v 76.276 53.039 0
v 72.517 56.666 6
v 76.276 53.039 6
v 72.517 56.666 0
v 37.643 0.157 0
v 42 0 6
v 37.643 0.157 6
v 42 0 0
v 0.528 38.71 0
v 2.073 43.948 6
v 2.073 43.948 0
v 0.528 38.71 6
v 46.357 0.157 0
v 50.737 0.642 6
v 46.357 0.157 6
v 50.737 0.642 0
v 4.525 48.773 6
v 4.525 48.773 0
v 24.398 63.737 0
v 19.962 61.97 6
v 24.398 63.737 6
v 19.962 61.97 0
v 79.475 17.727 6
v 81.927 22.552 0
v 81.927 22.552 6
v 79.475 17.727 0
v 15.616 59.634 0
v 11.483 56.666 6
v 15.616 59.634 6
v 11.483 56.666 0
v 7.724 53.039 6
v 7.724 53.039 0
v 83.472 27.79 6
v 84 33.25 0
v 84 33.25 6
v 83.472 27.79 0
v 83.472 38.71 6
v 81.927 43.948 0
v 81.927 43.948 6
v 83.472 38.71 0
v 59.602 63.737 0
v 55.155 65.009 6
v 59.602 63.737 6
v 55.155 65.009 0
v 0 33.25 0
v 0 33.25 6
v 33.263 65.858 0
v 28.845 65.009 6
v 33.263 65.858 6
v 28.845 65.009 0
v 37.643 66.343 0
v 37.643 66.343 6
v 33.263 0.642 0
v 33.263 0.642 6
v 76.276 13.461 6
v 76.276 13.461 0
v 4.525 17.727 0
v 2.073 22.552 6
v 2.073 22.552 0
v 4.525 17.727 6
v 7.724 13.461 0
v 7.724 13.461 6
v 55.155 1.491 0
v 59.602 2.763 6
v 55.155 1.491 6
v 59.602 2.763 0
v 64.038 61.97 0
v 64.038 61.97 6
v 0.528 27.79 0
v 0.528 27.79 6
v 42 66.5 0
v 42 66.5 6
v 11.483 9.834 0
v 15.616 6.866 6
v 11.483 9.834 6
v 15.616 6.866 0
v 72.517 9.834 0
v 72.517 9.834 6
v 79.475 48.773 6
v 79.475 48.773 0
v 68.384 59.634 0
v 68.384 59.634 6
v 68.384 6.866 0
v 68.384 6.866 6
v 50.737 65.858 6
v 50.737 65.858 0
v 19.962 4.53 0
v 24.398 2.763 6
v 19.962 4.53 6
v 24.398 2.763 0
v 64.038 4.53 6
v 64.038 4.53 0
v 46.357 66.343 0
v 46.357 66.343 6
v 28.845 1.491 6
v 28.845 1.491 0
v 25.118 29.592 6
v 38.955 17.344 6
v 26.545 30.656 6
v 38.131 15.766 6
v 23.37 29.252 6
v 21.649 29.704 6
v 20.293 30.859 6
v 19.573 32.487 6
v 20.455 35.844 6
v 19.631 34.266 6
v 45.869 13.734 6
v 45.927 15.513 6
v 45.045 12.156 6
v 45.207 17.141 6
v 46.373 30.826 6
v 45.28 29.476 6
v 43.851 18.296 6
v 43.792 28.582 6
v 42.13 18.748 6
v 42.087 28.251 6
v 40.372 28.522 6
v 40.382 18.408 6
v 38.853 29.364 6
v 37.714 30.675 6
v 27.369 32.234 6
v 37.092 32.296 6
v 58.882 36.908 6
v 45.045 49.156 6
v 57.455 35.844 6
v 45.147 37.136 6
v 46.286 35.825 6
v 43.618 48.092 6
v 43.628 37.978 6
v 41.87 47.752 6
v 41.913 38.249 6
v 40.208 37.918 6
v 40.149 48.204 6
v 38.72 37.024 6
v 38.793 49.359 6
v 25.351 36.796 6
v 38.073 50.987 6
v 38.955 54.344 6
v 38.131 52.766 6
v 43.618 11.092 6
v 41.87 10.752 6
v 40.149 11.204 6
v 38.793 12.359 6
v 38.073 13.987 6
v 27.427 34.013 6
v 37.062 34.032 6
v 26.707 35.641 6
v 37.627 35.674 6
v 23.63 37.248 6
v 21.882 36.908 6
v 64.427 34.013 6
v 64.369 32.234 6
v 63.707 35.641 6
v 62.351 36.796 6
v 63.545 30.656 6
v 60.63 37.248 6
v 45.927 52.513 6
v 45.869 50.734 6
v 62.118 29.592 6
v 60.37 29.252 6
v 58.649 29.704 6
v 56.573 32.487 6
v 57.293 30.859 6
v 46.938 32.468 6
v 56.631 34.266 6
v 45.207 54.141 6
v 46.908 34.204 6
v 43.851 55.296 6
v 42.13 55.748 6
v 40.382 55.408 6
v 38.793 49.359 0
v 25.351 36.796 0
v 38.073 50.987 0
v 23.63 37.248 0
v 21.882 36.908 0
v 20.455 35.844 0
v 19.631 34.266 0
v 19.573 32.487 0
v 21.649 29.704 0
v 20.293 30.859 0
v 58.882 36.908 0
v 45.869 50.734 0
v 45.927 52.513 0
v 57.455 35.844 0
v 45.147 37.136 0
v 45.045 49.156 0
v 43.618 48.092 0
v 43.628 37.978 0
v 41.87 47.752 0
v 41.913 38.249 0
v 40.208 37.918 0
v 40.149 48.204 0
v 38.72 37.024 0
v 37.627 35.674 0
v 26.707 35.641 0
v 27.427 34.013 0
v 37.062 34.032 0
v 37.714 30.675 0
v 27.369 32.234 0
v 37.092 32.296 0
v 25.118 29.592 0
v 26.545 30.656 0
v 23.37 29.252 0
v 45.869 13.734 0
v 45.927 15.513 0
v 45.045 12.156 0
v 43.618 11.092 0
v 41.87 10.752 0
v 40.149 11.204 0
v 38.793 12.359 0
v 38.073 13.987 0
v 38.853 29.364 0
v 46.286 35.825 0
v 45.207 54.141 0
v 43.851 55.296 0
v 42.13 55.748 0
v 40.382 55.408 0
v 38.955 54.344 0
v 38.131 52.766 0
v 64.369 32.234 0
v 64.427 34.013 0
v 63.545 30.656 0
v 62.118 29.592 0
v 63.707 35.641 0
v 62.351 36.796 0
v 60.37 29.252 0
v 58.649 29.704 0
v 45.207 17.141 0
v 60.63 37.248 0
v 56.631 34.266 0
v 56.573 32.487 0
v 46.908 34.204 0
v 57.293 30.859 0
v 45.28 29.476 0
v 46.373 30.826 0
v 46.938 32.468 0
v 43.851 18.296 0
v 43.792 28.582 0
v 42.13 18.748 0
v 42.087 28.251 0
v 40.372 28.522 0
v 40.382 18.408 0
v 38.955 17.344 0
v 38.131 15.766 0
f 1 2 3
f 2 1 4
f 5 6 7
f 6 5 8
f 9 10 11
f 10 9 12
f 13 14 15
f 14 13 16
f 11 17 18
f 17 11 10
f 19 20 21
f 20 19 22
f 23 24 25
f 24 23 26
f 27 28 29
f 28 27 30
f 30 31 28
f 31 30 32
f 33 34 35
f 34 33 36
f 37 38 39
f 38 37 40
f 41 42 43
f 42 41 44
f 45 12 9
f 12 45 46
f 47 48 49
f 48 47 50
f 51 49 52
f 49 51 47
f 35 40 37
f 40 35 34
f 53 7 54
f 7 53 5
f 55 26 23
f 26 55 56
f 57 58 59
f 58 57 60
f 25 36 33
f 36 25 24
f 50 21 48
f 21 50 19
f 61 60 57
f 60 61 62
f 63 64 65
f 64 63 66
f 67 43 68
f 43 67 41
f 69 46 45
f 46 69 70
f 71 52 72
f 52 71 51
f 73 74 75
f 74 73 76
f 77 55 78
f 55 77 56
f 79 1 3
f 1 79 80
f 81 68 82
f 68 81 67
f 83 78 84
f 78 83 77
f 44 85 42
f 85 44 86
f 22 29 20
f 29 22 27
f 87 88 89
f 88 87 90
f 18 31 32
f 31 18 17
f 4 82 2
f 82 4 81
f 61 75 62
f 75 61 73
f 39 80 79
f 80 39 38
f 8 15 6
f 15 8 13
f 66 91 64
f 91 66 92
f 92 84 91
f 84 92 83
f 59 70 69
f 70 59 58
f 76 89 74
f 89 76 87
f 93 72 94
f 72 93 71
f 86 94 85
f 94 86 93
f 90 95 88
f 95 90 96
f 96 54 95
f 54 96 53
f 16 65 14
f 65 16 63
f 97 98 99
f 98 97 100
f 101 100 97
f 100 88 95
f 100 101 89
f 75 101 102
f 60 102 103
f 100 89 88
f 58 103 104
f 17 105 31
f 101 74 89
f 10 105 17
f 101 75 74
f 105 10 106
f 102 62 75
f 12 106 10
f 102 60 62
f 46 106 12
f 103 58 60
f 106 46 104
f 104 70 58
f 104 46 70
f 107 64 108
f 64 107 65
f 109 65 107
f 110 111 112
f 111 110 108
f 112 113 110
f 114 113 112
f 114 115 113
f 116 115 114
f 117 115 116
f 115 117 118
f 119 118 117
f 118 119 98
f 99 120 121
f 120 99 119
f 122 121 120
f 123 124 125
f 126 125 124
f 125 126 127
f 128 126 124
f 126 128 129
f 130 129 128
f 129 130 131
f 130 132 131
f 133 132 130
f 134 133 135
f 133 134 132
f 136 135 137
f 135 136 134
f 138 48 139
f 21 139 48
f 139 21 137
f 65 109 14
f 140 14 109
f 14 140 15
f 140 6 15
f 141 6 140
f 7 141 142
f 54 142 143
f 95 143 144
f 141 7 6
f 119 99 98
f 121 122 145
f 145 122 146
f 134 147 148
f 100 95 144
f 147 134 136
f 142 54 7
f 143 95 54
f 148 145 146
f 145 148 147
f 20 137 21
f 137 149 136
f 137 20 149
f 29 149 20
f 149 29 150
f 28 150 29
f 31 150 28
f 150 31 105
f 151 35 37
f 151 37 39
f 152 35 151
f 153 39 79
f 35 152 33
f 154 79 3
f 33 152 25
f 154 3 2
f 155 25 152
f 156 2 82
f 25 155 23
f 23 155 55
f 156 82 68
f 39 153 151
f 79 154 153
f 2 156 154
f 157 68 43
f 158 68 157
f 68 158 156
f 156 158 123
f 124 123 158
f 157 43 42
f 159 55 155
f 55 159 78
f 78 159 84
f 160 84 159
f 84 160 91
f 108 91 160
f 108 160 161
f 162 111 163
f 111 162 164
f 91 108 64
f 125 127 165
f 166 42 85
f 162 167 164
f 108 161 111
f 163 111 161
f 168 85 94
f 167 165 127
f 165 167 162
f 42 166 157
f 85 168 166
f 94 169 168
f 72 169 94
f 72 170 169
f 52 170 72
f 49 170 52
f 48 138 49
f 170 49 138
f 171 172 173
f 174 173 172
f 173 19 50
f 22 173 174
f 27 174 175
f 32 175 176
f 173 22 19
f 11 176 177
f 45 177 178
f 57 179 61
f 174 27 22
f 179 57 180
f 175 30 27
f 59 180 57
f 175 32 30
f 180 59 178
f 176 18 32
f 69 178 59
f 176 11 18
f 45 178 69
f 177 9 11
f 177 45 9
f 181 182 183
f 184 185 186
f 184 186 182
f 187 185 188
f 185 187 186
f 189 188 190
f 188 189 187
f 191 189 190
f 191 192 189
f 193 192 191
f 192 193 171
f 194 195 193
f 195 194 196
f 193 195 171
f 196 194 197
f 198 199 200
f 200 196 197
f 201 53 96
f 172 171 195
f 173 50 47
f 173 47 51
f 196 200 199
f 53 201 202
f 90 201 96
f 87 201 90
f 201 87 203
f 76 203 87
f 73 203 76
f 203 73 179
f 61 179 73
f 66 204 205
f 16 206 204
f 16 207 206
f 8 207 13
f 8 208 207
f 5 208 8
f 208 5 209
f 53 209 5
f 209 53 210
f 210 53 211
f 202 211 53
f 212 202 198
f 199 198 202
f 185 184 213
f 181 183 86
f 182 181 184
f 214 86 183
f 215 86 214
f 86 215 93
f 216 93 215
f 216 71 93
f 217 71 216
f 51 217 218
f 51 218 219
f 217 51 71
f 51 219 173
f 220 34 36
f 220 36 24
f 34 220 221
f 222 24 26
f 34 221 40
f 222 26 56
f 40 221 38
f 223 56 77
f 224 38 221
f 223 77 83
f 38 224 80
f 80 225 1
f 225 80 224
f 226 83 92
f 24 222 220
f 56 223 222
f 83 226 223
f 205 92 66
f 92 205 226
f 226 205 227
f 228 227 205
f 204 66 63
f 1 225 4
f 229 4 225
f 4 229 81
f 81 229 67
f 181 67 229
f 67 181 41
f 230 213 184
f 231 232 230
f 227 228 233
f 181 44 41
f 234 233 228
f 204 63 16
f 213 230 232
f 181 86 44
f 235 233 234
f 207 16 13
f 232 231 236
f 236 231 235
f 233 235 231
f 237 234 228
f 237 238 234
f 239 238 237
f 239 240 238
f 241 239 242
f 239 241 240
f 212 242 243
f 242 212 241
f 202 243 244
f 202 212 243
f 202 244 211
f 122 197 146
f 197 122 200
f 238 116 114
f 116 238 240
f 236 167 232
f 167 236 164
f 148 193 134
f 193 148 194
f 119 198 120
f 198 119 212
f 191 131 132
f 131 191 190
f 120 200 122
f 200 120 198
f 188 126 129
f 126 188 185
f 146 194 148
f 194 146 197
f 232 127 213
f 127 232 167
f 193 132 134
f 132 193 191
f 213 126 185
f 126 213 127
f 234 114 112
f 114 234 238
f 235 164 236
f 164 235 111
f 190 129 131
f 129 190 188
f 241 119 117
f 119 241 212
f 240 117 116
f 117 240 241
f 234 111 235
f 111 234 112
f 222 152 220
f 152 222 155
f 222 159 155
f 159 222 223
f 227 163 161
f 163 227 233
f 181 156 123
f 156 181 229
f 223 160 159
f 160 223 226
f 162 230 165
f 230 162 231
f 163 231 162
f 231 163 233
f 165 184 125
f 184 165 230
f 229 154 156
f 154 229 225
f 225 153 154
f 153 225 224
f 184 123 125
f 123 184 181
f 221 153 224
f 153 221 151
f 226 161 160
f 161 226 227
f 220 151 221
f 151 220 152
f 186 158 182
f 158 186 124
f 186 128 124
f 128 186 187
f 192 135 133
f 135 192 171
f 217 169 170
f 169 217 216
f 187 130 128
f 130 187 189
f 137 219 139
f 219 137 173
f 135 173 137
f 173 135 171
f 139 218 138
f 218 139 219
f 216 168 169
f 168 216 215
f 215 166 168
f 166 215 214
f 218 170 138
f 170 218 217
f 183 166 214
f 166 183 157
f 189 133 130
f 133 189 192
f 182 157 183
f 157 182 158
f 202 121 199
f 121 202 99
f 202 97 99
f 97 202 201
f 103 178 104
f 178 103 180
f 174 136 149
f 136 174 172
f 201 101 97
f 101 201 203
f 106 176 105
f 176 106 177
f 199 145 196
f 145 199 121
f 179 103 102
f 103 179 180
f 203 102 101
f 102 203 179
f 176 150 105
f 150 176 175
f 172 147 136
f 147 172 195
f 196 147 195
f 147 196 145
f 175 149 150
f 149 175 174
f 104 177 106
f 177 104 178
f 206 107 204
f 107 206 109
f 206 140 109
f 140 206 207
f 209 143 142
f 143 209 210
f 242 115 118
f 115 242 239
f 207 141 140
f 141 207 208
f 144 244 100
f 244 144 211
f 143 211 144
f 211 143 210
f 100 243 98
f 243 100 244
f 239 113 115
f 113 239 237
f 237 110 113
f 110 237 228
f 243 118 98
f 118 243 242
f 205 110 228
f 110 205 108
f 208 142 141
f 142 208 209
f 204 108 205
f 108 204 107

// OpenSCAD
$fn = 32;

// ----------------------------------------------------------------------
// Cam plate: double_lobe cam, base R32
// ----------------------------------------------------------------------

// --- parameters (mm) ---
base_r = 32;              // base circle radius
lobe_h = 10;              // cam lobe rise
bore_r = 5;               // shaft bore radius
plate_t = 6;              // plate thickness, Z (extrusion height)
ring_r = 18.5;            // lightening ring radius
bolt_r = 4;               // lightening hole radius

profile = [[84, 33.25], [83.472, 38.71], [81.927, 43.948], [79.475, 48.773], [76.276, 53.039], [72.517, 56.666], [68.384, 59.634], [64.038, 61.97], [59.602, 63.737], [55.155, 65.009], [50.737, 65.858], [46.357, 66.343], [42, 66.5], [37.643, 66.343], [33.263, 65.858], [28.845, 65.009], [24.398, 63.737], [19.962, 61.97], [15.616, 59.634], [11.483, 56.666], [7.724, 53.039], [4.525, 48.773], [2.073, 43.948], [0.528, 38.71], [0, 33.25], [0.528, 27.79], [2.073, 22.552], [4.525, 17.727], [7.724, 13.461], [11.483, 9.834], [15.616, 6.866], [19.962, 4.53], [24.398, 2.763], [28.845, 1.491], [33.263, 0.642], [37.643, 0.157], [42, 0], [46.357, 0.157], [50.737, 0.642], [55.155, 1.491], [59.602, 2.763], [64.038, 4.53], [68.384, 6.866], [72.517, 9.834], [76.276, 13.461], [79.475, 17.727], [81.927, 22.552], [83.472, 27.79]];  // primary outline, 48 points, counter clockwise
void_1 = [[46.908, 34.204], [46.286, 35.825], [45.147, 37.136], [43.628, 37.978], [41.913, 38.249], [40.208, 37.918], [38.72, 37.024], [37.627, 35.674], [37.062, 34.032], [37.092, 32.296], [37.714, 30.675], [38.853, 29.364], [40.372, 28.522], [42.087, 28.251], [43.792, 28.582], [45.28, 29.476], [46.373, 30.826], [46.938, 32.468]];  // shaft bore, 18 points
void_2 = [[64.427, 34.013], [63.707, 35.641], [62.351, 36.796], [60.63, 37.248], [58.882, 36.908], [57.455, 35.844], [56.631, 34.266], [56.573, 32.487], [57.293, 30.859], [58.649, 29.704], [60.37, 29.252], [62.118, 29.592], [63.545, 30.656], [64.369, 32.234]];  // lightening hole 1, 14 points
void_3 = [[45.927, 52.513], [45.207, 54.141], [43.851, 55.296], [42.13, 55.748], [40.382, 55.408], [38.955, 54.344], [38.131, 52.766], [38.073, 50.987], [38.793, 49.359], [40.149, 48.204], [41.87, 47.752], [43.618, 48.092], [45.045, 49.156], [45.869, 50.734]];  // lightening hole 2, 14 points
void_4 = [[27.427, 34.013], [26.707, 35.641], [25.351, 36.796], [23.63, 37.248], [21.882, 36.908], [20.455, 35.844], [19.631, 34.266], [19.573, 32.487], [20.293, 30.859], [21.649, 29.704], [23.37, 29.252], [25.118, 29.592], [26.545, 30.656], [27.369, 32.234]];  // lightening hole 3, 14 points
void_5 = [[45.927, 15.513], [45.207, 17.141], [43.851, 18.296], [42.13, 18.748], [40.382, 18.408], [38.955, 17.344], [38.131, 15.766], [38.073, 13.987], [38.793, 12.359], [40.149, 11.204], [41.87, 10.752], [43.618, 11.092], [45.045, 12.156], [45.869, 13.734]];  // lightening hole 4, 14 points

// --- the one profile operation ---
difference() {
  linear_extrude(height = plate_t) polygon(points = profile);
  translate([0, 0, -1])
    linear_extrude(height = plate_t + 2) polygon(points = void_1);
  translate([0, 0, -1])
    linear_extrude(height = plate_t + 2) polygon(points = void_2);
  translate([0, 0, -1])
    linear_extrude(height = plate_t + 2) polygon(points = void_3);
  translate([0, 0, -1])
    linear_extrude(height = plate_t + 2) polygon(points = void_4);
  translate([0, 0, -1])
    linear_extrude(height = plate_t + 2) polygon(points = void_5);
}
